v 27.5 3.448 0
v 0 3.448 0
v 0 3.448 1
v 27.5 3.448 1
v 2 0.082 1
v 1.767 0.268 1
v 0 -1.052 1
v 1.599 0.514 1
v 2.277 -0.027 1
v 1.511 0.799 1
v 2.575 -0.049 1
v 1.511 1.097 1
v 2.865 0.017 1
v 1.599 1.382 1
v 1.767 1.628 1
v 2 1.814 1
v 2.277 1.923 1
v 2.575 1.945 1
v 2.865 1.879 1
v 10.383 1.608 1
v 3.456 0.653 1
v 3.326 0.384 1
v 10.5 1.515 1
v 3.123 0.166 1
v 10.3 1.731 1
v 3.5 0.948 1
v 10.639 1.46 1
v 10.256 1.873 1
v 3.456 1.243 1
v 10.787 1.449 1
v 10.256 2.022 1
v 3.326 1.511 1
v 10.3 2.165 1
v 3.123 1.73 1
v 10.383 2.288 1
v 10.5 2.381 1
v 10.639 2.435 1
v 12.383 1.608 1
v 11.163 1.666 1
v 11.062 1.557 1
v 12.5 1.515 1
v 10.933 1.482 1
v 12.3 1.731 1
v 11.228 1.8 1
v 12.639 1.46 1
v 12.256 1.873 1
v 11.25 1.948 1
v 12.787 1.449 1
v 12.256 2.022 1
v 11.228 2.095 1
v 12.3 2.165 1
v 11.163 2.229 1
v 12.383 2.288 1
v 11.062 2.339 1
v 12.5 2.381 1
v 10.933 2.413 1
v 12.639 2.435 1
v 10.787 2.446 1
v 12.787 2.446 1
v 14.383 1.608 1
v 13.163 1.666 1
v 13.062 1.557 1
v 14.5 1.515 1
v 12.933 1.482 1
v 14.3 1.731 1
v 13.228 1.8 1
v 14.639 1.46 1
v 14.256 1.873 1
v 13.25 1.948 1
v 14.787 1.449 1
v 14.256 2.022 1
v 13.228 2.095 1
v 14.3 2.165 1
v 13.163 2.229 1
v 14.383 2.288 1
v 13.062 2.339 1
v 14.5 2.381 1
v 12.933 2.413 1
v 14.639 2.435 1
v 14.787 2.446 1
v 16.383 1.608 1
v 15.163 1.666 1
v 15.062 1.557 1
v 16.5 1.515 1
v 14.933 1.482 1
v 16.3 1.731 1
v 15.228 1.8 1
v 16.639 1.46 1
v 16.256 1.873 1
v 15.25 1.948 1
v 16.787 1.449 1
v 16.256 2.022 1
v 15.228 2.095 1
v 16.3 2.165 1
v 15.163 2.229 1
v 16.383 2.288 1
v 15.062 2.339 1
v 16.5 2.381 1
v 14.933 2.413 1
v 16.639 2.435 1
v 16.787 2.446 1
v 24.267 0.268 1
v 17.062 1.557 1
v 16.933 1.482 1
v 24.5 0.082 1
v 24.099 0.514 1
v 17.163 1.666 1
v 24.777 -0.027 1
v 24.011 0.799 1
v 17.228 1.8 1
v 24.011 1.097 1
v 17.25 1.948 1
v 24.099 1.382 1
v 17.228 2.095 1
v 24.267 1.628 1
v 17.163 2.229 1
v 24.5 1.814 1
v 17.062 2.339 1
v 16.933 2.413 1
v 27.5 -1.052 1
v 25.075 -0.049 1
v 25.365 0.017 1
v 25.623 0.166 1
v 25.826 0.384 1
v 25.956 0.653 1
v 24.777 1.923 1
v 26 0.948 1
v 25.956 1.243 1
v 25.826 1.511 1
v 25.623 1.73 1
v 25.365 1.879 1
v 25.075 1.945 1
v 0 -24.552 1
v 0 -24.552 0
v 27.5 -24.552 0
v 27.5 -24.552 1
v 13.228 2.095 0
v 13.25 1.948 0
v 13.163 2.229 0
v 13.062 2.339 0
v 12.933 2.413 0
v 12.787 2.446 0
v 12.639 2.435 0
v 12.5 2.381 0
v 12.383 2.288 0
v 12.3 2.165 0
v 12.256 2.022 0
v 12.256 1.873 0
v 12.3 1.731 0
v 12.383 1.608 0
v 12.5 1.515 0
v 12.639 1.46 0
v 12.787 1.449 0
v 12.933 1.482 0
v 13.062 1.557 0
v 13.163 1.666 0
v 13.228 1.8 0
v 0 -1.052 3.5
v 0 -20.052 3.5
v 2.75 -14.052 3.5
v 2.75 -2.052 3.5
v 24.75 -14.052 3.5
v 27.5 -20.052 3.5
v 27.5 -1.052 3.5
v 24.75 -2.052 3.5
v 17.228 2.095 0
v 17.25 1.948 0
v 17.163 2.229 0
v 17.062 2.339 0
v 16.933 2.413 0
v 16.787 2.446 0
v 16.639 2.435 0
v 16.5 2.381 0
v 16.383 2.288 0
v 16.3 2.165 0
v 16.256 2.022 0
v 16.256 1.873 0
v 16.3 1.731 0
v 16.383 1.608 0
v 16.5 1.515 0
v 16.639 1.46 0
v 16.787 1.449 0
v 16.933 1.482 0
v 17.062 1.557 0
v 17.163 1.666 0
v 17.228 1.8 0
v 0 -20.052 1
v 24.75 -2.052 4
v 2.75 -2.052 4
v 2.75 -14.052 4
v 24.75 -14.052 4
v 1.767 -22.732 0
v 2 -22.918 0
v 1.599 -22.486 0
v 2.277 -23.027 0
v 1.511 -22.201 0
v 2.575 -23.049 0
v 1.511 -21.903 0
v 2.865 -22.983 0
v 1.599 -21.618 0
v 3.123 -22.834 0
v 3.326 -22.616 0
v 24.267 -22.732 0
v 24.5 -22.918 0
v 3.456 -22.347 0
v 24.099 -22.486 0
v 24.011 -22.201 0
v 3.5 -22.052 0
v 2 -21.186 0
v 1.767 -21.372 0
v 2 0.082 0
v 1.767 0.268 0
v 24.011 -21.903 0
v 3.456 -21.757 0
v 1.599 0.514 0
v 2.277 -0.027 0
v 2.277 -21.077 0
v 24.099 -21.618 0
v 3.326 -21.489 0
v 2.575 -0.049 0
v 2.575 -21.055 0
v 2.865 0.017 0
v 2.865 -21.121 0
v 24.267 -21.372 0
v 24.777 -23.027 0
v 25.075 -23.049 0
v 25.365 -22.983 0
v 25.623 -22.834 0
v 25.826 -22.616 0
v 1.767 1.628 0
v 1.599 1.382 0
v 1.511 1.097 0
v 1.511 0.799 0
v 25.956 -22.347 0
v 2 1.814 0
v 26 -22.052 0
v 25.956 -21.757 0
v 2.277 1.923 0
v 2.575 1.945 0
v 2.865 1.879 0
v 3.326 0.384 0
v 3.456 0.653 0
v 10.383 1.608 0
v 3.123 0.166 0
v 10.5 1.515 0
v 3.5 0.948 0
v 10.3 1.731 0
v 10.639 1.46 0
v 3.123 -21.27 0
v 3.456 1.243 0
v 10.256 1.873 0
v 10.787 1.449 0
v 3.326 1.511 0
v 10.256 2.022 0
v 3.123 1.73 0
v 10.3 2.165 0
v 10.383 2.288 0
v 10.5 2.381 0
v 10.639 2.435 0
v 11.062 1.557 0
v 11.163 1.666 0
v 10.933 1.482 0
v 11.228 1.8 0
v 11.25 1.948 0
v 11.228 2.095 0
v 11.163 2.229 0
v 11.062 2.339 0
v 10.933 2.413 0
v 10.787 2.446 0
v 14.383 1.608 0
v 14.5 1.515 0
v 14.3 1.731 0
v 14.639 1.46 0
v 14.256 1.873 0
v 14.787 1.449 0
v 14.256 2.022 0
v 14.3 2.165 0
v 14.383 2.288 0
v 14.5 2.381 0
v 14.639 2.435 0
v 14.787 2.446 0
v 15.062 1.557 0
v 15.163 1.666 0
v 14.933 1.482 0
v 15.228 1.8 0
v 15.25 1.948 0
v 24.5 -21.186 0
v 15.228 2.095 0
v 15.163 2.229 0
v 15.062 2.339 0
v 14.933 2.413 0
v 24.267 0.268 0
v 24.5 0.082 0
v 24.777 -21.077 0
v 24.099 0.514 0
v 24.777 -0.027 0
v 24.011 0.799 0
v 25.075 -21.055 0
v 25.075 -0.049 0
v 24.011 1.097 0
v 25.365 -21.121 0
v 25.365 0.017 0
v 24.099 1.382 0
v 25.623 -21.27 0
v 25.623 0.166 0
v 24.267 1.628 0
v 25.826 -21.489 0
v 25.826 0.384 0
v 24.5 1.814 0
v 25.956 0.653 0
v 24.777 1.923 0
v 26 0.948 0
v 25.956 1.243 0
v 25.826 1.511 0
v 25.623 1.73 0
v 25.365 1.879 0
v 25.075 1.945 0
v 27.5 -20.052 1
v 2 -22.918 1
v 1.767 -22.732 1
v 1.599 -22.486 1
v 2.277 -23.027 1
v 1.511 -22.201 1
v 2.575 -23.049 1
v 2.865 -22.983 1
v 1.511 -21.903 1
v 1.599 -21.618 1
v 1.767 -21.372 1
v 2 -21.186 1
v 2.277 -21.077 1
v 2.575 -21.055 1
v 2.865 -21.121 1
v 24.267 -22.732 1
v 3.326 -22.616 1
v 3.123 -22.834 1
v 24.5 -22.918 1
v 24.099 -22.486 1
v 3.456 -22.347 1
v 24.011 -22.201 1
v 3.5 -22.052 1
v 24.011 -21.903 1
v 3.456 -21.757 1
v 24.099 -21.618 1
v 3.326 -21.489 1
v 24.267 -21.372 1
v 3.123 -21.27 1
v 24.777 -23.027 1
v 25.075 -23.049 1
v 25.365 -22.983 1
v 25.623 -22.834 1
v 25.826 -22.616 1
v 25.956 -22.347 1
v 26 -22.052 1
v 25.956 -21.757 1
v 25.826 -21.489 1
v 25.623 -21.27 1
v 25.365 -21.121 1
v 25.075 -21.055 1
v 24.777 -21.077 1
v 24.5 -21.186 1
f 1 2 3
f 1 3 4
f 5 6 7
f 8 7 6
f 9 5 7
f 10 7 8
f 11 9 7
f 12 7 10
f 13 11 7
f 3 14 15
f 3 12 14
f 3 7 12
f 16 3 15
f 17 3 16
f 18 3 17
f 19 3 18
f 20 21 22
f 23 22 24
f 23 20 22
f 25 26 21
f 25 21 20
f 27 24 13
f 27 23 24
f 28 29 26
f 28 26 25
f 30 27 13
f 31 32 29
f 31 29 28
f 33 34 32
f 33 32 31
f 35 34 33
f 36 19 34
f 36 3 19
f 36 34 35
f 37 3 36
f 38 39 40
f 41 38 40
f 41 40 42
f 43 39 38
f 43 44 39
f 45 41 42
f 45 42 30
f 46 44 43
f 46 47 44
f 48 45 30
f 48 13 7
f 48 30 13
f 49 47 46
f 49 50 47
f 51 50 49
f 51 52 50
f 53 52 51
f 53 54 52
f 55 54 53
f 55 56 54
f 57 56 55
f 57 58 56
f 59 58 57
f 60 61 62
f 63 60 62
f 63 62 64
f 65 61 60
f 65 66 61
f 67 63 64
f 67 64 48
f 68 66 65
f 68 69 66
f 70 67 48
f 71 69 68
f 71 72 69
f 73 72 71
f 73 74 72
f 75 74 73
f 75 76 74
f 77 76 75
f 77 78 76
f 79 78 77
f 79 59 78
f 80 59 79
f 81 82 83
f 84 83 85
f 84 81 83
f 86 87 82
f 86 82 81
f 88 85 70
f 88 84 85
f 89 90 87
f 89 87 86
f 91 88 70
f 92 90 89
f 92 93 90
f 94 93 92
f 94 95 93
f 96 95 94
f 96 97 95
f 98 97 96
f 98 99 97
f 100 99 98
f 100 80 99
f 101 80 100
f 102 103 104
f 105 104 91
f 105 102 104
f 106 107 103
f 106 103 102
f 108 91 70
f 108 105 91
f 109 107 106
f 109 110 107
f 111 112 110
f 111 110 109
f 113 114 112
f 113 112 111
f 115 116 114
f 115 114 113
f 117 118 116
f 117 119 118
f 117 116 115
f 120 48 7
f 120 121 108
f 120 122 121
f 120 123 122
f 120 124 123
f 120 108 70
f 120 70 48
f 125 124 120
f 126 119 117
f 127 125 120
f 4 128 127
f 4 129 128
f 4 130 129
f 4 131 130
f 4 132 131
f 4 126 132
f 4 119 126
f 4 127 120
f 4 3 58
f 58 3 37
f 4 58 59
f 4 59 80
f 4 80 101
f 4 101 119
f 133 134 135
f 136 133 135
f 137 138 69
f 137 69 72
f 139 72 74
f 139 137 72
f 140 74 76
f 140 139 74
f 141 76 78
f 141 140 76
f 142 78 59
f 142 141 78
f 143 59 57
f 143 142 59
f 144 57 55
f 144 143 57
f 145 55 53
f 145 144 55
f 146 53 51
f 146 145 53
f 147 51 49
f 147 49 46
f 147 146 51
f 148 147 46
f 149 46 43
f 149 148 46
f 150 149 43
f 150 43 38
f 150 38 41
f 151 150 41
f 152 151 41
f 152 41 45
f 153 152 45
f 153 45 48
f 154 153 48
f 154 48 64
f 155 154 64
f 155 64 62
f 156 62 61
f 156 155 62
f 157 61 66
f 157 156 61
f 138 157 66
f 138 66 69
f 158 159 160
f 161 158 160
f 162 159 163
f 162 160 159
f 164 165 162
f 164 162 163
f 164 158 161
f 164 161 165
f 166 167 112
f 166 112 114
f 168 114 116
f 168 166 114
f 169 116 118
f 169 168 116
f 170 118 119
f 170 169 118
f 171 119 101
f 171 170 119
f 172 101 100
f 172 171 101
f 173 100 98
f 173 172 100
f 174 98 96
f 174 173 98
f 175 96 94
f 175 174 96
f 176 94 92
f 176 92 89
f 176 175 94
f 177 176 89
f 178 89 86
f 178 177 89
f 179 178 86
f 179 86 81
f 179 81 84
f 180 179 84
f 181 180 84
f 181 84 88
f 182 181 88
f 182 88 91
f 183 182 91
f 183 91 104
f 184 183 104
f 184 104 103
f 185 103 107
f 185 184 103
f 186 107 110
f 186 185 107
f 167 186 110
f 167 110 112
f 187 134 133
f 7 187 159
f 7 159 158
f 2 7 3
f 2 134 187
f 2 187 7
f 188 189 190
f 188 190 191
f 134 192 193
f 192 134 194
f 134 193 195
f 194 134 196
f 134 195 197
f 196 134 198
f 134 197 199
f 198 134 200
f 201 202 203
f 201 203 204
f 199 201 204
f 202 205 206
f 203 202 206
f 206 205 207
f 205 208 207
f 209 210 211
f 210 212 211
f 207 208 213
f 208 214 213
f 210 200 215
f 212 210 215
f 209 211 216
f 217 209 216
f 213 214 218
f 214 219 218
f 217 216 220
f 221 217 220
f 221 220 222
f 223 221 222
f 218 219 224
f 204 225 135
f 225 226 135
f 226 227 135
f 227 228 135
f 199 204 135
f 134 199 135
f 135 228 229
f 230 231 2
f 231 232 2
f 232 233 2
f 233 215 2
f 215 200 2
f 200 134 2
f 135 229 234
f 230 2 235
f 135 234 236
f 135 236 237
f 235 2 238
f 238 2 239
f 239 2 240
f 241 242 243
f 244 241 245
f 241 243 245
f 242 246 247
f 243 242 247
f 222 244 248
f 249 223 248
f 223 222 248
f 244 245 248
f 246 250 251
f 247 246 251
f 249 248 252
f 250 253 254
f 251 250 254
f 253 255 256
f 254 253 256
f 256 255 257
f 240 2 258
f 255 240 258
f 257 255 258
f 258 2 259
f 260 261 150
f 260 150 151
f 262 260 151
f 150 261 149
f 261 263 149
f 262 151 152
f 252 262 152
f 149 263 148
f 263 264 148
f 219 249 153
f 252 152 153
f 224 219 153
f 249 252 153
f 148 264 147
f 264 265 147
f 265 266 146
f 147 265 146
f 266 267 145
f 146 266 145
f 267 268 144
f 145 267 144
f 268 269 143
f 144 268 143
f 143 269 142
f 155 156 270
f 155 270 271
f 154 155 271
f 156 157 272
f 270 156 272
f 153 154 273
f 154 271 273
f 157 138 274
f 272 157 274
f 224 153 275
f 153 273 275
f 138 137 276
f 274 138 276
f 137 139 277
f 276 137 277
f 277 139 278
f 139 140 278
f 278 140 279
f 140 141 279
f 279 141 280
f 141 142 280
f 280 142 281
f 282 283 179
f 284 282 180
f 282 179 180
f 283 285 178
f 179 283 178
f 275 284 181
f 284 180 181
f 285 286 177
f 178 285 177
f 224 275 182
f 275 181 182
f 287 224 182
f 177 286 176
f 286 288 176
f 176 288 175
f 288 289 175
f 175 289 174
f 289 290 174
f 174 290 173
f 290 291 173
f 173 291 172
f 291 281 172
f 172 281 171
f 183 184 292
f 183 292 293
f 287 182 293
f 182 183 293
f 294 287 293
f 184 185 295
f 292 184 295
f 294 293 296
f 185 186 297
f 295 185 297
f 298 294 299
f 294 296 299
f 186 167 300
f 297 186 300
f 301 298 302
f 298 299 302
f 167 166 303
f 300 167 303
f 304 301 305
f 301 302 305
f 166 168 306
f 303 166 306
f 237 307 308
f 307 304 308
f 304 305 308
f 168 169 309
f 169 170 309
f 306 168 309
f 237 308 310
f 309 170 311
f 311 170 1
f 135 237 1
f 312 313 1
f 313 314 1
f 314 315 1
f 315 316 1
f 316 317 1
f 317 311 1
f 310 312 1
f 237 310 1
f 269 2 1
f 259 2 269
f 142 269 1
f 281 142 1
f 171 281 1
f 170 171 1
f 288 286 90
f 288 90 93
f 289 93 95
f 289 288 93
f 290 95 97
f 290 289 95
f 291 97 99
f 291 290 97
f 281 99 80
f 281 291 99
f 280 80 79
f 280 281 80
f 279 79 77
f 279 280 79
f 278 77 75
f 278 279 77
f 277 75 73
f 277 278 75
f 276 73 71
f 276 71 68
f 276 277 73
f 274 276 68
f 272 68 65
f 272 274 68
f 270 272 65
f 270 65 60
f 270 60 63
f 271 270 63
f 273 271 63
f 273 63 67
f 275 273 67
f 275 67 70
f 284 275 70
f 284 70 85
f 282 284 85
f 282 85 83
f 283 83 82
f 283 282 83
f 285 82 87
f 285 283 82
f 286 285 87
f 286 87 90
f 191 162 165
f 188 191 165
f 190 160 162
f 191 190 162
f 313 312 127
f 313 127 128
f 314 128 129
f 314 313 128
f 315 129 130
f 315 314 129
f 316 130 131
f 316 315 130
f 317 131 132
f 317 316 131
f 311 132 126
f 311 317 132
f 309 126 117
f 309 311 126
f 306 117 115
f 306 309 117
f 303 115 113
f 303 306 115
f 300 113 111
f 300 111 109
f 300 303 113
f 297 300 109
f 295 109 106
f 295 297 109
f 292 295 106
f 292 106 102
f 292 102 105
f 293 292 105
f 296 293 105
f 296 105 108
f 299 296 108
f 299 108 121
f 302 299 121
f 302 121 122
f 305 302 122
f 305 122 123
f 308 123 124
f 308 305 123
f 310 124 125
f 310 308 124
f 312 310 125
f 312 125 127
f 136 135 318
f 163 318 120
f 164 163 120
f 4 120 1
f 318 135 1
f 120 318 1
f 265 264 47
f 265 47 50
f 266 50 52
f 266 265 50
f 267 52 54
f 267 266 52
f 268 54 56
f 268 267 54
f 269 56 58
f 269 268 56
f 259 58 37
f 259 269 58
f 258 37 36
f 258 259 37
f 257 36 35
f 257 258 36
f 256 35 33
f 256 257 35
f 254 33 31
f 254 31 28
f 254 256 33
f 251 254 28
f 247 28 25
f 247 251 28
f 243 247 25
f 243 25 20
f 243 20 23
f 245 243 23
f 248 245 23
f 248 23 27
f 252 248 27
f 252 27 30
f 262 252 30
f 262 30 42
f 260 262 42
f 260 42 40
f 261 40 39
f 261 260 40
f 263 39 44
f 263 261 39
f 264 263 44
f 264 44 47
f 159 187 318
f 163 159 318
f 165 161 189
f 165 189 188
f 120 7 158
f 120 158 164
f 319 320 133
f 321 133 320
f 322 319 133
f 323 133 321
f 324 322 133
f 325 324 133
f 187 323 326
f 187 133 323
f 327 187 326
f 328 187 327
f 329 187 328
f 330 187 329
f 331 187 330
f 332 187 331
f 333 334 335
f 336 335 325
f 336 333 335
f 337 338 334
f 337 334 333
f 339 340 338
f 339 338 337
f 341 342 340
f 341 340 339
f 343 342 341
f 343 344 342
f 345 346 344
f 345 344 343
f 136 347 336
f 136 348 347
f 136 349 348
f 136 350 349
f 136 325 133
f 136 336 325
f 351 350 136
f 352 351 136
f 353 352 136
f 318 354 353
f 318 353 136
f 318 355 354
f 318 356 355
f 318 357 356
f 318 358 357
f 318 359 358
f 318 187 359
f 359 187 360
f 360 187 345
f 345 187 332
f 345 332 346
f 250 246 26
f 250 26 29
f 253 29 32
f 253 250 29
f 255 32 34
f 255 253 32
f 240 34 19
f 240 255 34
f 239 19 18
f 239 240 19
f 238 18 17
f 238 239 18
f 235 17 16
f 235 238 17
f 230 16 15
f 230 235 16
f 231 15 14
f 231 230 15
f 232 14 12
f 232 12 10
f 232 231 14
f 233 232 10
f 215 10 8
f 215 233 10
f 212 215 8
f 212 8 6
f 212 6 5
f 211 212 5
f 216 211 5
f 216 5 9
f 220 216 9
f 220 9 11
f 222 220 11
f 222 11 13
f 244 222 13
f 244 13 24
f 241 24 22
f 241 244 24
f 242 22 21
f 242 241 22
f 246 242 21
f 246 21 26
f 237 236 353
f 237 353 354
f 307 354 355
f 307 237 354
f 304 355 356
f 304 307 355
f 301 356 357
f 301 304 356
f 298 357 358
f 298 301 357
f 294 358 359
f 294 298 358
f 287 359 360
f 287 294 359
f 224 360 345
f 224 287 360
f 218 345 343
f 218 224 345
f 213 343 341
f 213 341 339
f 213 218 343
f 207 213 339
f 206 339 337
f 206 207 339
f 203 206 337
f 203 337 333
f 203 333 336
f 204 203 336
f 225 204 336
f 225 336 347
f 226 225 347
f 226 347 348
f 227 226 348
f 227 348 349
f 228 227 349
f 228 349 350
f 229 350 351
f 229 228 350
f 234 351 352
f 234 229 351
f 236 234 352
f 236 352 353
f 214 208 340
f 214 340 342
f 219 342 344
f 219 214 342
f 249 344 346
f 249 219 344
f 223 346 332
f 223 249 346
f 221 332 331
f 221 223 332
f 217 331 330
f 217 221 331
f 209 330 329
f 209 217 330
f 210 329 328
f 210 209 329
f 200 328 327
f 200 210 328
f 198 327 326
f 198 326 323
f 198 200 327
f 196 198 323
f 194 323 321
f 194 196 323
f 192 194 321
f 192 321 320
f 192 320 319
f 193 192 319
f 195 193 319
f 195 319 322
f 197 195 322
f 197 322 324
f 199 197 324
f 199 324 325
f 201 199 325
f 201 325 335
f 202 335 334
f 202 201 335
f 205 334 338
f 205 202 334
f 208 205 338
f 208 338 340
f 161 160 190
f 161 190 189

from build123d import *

# Parameters (mm, degrees)
SKETCH1_W           = 27.5
SKETCH1_H           = 19
SKETCH1_W_2         = 22
SKETCH1_H_2         = 12
BOSS_EXTRUDE1_DEPTH = 3.5
SKETCH1_3_W         = 27.5
SKETCH1_3_H         = 4.5
SKETCH1_3_R         = 1
SKETCH1_3_R_2       = 0.5
BOSS_EXTRUDE2_DEPTH = 1
SKETCH1_4_W         = 22
SKETCH1_4_H         = 12
BOSS_EXTRUDE3_DEPTH = 4


with BuildPart() as part:
    # Sketch1 → Boss-Extrude1 (new body)
    with BuildSketch(Plane.XY):
        with Locations((13.75, -10.552238806)):
            Rectangle(SKETCH1_W, SKETCH1_H)
        with Locations((13.75, -8.052238806)):
            Rectangle(SKETCH1_W_2, SKETCH1_H_2, mode=Mode.SUBTRACT)
    extrude(amount=BOSS_EXTRUDE1_DEPTH)

    # Sketch1<3> → Boss-Extrude2 (add)
    # profile 1 of 2: a face of its own
    with BuildSketch(Plane.XY):
        with Locations((13.75, 1.197761194)):
            Rectangle(SKETCH1_3_W, SKETCH1_3_H)
        with Locations((2.5, 0.947761194)):
            Circle(SKETCH1_3_R, mode=Mode.SUBTRACT)
        with Locations((10.75, 1.947761194)):
            Circle(SKETCH1_3_R_2, mode=Mode.SUBTRACT)
        with Locations((12.75, 1.947761194)):
            Circle(SKETCH1_3_R_2, mode=Mode.SUBTRACT)
        with Locations((14.75, 1.947761194)):
            Circle(SKETCH1_3_R_2, mode=Mode.SUBTRACT)
        with Locations((16.75, 1.947761194)):
            Circle(SKETCH1_3_R_2, mode=Mode.SUBTRACT)
        with Locations((25, 0.947761194)):
            Circle(SKETCH1_3_R, mode=Mode.SUBTRACT)
    # profile 2 of 2: a face of its own
    with BuildSketch(Plane.XY):
        with Locations((13.75, -22.302238806)):
            Rectangle(SKETCH1_3_W, SKETCH1_3_H)
        with Locations((2.5, -22.052238806)):
            Circle(SKETCH1_3_R, mode=Mode.SUBTRACT)
        with Locations((25, -22.052238806)):
            Circle(SKETCH1_3_R, mode=Mode.SUBTRACT)
    extrude(amount=BOSS_EXTRUDE2_DEPTH)

    # Sketch1<4> → Boss-Extrude3 (add)
    with BuildSketch(Plane.XY):
        with Locations((13.75, -8.052238806)):
            Rectangle(SKETCH1_4_W, SKETCH1_4_H)
    extrude(amount=BOSS_EXTRUDE3_DEPTH)


solid = part.part
